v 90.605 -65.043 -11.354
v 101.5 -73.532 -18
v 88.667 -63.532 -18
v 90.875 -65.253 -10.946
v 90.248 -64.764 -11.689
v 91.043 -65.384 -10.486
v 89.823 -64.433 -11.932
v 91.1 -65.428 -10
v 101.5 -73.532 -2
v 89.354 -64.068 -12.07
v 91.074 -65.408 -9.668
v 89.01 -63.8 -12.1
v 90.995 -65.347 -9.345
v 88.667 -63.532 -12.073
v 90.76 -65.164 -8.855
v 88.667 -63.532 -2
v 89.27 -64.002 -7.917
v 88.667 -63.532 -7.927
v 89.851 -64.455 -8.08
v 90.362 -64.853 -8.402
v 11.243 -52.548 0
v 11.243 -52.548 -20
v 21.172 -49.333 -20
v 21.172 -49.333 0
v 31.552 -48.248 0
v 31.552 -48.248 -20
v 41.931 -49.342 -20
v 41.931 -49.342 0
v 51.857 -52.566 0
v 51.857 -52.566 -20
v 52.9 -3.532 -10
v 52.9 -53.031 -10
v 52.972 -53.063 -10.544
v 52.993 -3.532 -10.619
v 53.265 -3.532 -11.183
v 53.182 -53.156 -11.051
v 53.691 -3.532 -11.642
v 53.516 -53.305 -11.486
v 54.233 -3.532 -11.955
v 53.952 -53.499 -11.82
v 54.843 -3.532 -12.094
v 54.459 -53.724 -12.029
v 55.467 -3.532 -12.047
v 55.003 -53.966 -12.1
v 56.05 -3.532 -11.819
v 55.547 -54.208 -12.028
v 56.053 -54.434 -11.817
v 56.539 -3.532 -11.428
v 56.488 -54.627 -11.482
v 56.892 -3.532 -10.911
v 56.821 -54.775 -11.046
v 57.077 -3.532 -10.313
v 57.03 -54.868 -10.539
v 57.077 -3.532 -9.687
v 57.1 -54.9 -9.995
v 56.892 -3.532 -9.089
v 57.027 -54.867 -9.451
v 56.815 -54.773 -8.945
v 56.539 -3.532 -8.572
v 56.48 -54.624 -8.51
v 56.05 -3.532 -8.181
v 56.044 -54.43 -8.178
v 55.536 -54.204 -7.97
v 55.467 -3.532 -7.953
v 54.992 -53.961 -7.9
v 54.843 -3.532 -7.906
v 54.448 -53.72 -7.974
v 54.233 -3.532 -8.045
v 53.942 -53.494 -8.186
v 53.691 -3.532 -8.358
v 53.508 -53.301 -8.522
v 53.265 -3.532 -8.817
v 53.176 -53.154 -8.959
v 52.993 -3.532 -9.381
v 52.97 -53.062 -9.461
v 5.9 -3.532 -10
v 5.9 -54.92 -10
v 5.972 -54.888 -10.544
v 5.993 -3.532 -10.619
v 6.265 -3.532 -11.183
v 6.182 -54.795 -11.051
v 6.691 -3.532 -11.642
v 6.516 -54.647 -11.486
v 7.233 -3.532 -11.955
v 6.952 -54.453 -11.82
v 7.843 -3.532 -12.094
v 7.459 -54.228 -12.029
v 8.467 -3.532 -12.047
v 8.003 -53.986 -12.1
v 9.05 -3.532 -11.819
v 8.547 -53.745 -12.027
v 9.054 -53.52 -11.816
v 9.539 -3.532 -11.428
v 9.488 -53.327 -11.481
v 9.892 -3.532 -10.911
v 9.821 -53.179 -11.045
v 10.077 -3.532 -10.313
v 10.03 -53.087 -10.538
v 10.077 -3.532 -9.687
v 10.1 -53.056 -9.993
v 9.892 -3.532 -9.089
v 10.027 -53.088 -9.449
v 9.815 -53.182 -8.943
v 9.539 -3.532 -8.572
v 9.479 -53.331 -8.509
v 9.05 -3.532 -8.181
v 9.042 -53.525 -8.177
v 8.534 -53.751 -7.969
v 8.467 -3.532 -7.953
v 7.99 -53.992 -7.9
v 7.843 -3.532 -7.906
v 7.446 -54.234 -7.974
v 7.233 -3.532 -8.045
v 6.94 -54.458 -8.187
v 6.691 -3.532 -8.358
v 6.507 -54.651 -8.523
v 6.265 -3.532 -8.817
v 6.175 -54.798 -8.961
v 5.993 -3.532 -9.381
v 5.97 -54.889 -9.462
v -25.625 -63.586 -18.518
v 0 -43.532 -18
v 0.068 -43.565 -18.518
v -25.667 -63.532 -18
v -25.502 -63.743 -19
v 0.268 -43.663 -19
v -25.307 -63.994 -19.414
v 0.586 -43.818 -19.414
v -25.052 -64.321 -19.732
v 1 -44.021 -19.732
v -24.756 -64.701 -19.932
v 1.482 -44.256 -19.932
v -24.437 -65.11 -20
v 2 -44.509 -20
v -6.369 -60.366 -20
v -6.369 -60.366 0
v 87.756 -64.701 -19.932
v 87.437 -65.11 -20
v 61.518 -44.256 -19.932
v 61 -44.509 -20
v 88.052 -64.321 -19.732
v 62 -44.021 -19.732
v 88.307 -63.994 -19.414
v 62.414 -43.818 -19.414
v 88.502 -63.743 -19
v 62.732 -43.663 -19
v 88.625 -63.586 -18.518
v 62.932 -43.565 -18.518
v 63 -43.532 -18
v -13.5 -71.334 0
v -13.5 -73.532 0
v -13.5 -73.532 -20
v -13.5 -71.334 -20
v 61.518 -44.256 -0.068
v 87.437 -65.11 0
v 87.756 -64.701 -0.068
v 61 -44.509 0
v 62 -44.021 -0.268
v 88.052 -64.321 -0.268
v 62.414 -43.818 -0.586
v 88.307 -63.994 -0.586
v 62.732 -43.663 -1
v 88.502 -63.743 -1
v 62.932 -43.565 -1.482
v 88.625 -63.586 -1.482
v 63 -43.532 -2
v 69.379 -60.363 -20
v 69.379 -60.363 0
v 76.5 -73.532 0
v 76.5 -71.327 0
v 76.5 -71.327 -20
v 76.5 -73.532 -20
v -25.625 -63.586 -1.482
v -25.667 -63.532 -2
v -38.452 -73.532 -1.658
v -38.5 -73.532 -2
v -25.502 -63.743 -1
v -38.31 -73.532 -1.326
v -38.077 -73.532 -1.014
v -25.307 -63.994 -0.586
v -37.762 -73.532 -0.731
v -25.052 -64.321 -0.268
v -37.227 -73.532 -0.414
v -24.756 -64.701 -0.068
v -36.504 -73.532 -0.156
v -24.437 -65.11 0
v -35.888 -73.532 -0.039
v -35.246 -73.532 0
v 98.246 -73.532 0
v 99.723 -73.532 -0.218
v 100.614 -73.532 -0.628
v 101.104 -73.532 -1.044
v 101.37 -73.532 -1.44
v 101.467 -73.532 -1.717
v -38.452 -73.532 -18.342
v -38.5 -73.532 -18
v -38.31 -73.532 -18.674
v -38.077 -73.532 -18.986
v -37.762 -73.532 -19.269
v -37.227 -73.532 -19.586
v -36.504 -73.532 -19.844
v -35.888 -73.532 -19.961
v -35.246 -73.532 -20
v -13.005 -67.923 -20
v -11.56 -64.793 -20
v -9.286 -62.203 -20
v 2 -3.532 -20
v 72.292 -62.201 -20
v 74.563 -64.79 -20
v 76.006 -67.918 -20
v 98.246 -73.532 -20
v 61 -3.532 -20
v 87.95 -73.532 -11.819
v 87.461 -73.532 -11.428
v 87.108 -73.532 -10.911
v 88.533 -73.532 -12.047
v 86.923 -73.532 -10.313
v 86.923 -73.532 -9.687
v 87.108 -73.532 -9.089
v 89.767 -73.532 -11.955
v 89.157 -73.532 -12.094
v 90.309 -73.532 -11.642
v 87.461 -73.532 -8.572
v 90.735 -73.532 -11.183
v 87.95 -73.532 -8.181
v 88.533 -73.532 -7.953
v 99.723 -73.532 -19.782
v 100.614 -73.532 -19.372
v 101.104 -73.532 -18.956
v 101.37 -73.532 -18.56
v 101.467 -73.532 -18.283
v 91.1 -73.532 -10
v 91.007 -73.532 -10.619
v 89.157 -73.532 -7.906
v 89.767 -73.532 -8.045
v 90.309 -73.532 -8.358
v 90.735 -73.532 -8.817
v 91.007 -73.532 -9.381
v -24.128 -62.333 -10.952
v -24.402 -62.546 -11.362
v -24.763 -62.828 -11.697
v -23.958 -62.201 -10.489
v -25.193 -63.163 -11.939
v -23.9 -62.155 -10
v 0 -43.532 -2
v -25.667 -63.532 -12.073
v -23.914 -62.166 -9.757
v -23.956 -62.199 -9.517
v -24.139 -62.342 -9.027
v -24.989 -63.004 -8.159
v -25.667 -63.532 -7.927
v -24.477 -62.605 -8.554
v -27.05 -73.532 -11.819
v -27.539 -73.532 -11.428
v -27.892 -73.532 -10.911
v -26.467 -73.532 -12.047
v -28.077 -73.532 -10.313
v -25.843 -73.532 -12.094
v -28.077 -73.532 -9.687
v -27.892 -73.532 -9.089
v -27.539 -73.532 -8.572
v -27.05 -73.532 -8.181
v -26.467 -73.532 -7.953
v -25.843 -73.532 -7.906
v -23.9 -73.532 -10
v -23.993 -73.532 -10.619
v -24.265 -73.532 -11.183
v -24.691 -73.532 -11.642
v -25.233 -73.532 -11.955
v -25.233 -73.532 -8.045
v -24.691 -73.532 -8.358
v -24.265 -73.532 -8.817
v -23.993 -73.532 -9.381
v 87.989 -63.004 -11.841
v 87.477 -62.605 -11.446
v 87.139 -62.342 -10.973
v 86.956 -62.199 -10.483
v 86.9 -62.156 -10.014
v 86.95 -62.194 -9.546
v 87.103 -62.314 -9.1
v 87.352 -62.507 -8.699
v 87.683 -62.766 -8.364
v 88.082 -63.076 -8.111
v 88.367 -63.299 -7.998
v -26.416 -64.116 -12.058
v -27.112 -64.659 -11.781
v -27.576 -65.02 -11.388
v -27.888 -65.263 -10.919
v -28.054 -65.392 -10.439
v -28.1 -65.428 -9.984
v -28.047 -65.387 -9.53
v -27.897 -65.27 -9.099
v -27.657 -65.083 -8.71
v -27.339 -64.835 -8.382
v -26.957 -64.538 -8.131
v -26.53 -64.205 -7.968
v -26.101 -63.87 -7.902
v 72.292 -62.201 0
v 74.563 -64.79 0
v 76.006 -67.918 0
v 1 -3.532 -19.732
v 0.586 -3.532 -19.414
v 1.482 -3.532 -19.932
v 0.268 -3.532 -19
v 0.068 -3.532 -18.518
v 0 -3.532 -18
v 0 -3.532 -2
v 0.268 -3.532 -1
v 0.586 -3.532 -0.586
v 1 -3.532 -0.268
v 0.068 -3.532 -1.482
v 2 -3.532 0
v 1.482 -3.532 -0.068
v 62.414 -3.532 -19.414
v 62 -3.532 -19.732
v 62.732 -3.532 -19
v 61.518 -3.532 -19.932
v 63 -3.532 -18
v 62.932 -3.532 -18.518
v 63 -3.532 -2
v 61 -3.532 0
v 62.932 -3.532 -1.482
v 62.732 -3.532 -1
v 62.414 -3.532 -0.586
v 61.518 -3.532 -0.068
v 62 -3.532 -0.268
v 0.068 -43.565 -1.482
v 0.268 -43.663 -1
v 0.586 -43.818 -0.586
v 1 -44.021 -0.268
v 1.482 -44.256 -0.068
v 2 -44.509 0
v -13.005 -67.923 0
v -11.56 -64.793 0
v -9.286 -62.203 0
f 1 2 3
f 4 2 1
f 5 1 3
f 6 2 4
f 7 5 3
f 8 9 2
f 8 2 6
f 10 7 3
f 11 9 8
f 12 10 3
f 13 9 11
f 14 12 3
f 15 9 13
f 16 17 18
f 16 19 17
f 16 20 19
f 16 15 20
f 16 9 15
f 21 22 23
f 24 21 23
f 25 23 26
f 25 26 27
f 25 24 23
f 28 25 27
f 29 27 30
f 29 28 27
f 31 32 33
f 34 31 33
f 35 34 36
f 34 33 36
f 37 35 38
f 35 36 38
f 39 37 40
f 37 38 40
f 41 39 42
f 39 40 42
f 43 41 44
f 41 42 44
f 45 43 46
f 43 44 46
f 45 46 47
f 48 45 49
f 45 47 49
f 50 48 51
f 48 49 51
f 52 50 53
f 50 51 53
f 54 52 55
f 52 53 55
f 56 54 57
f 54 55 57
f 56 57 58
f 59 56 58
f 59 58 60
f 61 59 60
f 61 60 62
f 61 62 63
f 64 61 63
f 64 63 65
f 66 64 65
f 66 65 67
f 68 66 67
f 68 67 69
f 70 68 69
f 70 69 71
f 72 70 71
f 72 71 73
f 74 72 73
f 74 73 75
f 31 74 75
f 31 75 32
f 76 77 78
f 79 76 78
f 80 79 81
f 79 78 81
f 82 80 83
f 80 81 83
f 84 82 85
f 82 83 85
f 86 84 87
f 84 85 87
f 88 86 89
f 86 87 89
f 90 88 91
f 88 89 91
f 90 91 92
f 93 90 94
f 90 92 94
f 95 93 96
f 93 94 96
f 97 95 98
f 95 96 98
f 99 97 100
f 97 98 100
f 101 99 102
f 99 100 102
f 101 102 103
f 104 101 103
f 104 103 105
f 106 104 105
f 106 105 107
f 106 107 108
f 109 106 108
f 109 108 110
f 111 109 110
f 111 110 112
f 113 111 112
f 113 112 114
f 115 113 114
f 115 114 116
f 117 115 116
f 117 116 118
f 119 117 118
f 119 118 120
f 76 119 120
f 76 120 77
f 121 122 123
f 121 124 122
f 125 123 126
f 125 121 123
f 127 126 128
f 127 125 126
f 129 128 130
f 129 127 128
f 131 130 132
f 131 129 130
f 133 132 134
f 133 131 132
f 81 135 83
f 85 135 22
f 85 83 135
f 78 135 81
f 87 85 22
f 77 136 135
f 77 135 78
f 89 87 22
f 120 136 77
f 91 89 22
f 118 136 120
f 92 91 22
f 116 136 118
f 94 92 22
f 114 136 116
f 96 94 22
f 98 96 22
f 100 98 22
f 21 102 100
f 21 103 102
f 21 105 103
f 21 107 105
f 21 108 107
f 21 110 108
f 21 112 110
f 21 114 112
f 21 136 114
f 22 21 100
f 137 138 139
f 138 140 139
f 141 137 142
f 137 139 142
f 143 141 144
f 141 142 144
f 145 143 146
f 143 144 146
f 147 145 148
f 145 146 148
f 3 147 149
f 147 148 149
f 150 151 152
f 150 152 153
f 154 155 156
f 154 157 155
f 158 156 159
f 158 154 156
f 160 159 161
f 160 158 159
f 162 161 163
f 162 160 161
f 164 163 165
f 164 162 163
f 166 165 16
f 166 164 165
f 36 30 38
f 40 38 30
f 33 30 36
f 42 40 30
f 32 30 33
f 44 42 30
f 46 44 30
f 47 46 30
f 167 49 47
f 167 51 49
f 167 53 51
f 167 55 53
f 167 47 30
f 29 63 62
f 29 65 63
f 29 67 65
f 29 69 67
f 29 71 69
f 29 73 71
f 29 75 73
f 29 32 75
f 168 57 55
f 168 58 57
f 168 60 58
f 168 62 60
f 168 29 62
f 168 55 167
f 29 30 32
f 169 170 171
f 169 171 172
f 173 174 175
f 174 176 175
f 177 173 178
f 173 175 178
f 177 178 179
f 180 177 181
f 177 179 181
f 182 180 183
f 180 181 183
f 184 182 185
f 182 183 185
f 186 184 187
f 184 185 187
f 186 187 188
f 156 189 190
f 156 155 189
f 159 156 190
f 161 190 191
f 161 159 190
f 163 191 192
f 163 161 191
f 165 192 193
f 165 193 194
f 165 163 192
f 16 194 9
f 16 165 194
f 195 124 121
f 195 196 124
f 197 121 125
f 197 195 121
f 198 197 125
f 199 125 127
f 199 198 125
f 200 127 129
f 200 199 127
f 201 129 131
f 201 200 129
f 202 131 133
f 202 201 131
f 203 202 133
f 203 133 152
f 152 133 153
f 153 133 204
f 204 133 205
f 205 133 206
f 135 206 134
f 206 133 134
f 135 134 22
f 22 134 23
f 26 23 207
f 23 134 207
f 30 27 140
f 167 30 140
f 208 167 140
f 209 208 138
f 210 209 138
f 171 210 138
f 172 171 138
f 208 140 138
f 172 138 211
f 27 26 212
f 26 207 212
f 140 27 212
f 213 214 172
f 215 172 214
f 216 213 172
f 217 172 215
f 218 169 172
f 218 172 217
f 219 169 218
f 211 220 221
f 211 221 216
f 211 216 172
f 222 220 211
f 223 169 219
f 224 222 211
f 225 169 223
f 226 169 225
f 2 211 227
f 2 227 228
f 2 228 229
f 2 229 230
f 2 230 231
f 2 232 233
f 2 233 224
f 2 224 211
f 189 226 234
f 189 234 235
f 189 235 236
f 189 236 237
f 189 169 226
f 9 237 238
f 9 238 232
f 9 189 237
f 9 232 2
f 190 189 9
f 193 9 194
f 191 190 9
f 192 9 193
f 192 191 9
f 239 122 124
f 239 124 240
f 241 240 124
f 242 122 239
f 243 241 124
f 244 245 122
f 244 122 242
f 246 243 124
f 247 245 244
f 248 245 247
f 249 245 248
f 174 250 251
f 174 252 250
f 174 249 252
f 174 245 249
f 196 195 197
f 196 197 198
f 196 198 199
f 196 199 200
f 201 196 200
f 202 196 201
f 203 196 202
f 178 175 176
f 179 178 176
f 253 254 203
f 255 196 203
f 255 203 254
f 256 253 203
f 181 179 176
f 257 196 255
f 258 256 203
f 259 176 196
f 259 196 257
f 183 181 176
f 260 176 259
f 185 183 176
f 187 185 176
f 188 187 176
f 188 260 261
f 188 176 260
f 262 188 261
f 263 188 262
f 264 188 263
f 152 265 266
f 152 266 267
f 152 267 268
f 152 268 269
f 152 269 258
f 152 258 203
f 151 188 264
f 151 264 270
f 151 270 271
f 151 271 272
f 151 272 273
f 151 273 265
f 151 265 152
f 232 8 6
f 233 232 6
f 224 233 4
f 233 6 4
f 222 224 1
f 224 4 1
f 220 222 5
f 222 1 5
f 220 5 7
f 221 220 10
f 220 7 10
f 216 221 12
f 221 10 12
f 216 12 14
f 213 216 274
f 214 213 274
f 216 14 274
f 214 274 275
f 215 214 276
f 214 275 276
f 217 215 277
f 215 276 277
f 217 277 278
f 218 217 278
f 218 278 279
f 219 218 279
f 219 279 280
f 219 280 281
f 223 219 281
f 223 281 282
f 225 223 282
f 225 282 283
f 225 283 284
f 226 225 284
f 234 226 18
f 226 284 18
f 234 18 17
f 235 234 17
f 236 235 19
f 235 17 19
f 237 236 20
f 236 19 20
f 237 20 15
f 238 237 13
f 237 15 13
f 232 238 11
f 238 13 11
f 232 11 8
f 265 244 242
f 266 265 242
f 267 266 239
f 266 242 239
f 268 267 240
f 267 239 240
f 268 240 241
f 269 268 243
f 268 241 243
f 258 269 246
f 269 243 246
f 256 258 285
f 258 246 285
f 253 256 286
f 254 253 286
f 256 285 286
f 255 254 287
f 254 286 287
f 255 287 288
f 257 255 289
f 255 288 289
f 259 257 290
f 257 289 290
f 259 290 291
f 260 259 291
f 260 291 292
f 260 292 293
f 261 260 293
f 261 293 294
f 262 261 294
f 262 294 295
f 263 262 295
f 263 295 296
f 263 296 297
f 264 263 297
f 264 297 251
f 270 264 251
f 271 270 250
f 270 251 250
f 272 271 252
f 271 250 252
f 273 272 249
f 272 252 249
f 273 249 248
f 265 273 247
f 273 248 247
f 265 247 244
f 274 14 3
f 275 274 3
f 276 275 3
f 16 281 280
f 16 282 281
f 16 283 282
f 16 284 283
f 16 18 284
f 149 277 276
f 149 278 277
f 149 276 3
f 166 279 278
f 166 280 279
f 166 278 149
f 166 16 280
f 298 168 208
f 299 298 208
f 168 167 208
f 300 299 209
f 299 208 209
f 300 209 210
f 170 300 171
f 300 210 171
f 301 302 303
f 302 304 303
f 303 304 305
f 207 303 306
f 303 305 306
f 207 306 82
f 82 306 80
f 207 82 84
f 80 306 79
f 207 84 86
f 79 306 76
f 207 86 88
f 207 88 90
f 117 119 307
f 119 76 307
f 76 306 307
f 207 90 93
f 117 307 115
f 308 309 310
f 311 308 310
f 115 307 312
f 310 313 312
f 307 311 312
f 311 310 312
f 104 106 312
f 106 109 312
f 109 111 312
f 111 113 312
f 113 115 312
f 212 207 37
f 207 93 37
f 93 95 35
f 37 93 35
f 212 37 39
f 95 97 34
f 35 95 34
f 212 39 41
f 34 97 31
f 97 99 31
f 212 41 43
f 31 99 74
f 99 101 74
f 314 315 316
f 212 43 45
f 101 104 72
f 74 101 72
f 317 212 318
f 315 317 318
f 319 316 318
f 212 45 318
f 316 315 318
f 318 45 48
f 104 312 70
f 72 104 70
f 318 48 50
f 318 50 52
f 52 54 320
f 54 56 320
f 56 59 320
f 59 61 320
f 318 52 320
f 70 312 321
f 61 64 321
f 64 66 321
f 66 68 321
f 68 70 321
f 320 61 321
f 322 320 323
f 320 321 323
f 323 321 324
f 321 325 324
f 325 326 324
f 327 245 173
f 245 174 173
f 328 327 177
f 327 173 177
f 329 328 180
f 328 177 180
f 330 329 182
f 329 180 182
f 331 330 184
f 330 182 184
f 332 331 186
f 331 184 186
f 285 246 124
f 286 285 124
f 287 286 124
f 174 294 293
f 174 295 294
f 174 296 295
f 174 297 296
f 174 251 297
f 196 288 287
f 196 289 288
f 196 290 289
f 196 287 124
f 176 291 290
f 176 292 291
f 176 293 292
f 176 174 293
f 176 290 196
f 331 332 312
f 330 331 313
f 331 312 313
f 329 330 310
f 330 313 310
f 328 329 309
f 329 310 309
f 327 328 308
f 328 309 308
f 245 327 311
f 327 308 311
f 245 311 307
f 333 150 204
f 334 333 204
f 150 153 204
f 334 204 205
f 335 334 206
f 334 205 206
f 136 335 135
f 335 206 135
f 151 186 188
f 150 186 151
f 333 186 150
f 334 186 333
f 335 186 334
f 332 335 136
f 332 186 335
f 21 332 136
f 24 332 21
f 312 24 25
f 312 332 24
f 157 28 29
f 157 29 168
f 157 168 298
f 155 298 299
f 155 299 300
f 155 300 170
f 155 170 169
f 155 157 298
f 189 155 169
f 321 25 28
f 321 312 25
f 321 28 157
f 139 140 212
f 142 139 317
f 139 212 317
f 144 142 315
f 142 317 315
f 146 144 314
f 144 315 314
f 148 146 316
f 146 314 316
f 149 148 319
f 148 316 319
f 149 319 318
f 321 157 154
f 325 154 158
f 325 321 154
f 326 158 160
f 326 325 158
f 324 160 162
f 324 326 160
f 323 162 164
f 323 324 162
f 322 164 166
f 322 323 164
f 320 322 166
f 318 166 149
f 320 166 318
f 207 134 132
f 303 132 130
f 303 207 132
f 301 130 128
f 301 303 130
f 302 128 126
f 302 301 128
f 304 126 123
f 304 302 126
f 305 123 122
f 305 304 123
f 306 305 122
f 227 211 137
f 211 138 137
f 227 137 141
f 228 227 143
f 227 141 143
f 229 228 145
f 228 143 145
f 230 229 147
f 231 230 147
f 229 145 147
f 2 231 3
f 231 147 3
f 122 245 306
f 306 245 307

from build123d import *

# Parameters (mm, degrees)
SKETCH8_W                   = 63
SKETCH8_H                   = 40
BOSS_EXTRUDE3_DEPTH         = 20
TAP_DRILL_FOR_M5X0_8_TAP2_D = 4.2
FILLET4_R                   = 2
TAP_DRILL_FOR_M5X0_8_TAP3_D = 4.2
FILLET6_R                   = 12


with BuildPart() as part:
    # Sketch8 → Boss-Extrude3 (new body)
    with BuildSketch(Plane.XY):
        with BuildLine():
            Line((63, -43.532093881), (0, -43.532093881))
            Line((0, -43.532093881), (-25.666666667, -63.532093881))
            Line((-25.666666667, -63.532093881), (-13.5, -63.532093881))
            Line((-13.5, -63.532093881), (11.242912026, -52.54839108))
            ThreePointArc((11.242912026, -52.54839108), (31.551767994, -48.24798089), (51.856795198, -52.56643302))
            Line((51.856795198, -52.56643302), (76.5, -63.532093881))
            Line((76.5, -63.532093881), (88.666666667, -63.532093881))
            Line((88.666666667, -63.532093881), (63, -43.532093881))
        make_face()
        with Locations((31.5, -23.532093881)):
            Rectangle(SKETCH8_W, SKETCH8_H)
        Polygon((-13.5, -63.532093881), (-25.666666667, -63.532093881), (-38.5, -73.532093881), (-13.5, -73.532093881), align=None)
        Polygon((101.5, -73.532093881), (88.666666667, -63.532093881), (76.5, -63.532093881), (76.5, -73.532093881), align=None)
    extrude(amount=-BOSS_EXTRUDE3_DEPTH)

    # Tap Drill for M5x0.8 Tap2 (through all)
    with Locations(Plane(origin=(0, -73.532093881, 0), x_dir=(-1, 0, 0), z_dir=(0, -1, 0))):
        with Locations((26, 10), (-89, 10)):
            Hole(TAP_DRILL_FOR_M5X0_8_TAP2_D / 2)

    # Fillet4
    fillet4_edges = [part.edges().sort_by_distance(p)[0] for p in [
        (63, -23.532093881, 0),
        (82.25, -58.532093881, 0),
        (-19.25, -58.532093881, 0),
        (0, -23.532093881, 0),
        (0, -23.532093881, -20),
        (82.25, -58.532093881, -20),
        (63, -23.532093881, -20),
        (-19.25, -58.532093881, -20),
    ]]
    fillet(fillet4_edges, radius=FILLET4_R)

    # Tap Drill for M5x0.8 Tap3 (through all)
    with Locations(Plane(origin=(0, -3.532093881, 0), x_dir=(1, 0, 0), z_dir=(0, 1, 0))):
        with Locations((8, 10), (55, 10)):
            Hole(TAP_DRILL_FOR_M5X0_8_TAP3_D / 2)

    # Fillet6
    fillet6_edges = [part.edges().sort_by_distance(p)[0] for p in [
        (76.5, -63.532093881, -10),
        (-13.5, -63.532093881, -10),
    ]]
    fillet(fillet6_edges, radius=FILLET6_R)


solid = part.part
